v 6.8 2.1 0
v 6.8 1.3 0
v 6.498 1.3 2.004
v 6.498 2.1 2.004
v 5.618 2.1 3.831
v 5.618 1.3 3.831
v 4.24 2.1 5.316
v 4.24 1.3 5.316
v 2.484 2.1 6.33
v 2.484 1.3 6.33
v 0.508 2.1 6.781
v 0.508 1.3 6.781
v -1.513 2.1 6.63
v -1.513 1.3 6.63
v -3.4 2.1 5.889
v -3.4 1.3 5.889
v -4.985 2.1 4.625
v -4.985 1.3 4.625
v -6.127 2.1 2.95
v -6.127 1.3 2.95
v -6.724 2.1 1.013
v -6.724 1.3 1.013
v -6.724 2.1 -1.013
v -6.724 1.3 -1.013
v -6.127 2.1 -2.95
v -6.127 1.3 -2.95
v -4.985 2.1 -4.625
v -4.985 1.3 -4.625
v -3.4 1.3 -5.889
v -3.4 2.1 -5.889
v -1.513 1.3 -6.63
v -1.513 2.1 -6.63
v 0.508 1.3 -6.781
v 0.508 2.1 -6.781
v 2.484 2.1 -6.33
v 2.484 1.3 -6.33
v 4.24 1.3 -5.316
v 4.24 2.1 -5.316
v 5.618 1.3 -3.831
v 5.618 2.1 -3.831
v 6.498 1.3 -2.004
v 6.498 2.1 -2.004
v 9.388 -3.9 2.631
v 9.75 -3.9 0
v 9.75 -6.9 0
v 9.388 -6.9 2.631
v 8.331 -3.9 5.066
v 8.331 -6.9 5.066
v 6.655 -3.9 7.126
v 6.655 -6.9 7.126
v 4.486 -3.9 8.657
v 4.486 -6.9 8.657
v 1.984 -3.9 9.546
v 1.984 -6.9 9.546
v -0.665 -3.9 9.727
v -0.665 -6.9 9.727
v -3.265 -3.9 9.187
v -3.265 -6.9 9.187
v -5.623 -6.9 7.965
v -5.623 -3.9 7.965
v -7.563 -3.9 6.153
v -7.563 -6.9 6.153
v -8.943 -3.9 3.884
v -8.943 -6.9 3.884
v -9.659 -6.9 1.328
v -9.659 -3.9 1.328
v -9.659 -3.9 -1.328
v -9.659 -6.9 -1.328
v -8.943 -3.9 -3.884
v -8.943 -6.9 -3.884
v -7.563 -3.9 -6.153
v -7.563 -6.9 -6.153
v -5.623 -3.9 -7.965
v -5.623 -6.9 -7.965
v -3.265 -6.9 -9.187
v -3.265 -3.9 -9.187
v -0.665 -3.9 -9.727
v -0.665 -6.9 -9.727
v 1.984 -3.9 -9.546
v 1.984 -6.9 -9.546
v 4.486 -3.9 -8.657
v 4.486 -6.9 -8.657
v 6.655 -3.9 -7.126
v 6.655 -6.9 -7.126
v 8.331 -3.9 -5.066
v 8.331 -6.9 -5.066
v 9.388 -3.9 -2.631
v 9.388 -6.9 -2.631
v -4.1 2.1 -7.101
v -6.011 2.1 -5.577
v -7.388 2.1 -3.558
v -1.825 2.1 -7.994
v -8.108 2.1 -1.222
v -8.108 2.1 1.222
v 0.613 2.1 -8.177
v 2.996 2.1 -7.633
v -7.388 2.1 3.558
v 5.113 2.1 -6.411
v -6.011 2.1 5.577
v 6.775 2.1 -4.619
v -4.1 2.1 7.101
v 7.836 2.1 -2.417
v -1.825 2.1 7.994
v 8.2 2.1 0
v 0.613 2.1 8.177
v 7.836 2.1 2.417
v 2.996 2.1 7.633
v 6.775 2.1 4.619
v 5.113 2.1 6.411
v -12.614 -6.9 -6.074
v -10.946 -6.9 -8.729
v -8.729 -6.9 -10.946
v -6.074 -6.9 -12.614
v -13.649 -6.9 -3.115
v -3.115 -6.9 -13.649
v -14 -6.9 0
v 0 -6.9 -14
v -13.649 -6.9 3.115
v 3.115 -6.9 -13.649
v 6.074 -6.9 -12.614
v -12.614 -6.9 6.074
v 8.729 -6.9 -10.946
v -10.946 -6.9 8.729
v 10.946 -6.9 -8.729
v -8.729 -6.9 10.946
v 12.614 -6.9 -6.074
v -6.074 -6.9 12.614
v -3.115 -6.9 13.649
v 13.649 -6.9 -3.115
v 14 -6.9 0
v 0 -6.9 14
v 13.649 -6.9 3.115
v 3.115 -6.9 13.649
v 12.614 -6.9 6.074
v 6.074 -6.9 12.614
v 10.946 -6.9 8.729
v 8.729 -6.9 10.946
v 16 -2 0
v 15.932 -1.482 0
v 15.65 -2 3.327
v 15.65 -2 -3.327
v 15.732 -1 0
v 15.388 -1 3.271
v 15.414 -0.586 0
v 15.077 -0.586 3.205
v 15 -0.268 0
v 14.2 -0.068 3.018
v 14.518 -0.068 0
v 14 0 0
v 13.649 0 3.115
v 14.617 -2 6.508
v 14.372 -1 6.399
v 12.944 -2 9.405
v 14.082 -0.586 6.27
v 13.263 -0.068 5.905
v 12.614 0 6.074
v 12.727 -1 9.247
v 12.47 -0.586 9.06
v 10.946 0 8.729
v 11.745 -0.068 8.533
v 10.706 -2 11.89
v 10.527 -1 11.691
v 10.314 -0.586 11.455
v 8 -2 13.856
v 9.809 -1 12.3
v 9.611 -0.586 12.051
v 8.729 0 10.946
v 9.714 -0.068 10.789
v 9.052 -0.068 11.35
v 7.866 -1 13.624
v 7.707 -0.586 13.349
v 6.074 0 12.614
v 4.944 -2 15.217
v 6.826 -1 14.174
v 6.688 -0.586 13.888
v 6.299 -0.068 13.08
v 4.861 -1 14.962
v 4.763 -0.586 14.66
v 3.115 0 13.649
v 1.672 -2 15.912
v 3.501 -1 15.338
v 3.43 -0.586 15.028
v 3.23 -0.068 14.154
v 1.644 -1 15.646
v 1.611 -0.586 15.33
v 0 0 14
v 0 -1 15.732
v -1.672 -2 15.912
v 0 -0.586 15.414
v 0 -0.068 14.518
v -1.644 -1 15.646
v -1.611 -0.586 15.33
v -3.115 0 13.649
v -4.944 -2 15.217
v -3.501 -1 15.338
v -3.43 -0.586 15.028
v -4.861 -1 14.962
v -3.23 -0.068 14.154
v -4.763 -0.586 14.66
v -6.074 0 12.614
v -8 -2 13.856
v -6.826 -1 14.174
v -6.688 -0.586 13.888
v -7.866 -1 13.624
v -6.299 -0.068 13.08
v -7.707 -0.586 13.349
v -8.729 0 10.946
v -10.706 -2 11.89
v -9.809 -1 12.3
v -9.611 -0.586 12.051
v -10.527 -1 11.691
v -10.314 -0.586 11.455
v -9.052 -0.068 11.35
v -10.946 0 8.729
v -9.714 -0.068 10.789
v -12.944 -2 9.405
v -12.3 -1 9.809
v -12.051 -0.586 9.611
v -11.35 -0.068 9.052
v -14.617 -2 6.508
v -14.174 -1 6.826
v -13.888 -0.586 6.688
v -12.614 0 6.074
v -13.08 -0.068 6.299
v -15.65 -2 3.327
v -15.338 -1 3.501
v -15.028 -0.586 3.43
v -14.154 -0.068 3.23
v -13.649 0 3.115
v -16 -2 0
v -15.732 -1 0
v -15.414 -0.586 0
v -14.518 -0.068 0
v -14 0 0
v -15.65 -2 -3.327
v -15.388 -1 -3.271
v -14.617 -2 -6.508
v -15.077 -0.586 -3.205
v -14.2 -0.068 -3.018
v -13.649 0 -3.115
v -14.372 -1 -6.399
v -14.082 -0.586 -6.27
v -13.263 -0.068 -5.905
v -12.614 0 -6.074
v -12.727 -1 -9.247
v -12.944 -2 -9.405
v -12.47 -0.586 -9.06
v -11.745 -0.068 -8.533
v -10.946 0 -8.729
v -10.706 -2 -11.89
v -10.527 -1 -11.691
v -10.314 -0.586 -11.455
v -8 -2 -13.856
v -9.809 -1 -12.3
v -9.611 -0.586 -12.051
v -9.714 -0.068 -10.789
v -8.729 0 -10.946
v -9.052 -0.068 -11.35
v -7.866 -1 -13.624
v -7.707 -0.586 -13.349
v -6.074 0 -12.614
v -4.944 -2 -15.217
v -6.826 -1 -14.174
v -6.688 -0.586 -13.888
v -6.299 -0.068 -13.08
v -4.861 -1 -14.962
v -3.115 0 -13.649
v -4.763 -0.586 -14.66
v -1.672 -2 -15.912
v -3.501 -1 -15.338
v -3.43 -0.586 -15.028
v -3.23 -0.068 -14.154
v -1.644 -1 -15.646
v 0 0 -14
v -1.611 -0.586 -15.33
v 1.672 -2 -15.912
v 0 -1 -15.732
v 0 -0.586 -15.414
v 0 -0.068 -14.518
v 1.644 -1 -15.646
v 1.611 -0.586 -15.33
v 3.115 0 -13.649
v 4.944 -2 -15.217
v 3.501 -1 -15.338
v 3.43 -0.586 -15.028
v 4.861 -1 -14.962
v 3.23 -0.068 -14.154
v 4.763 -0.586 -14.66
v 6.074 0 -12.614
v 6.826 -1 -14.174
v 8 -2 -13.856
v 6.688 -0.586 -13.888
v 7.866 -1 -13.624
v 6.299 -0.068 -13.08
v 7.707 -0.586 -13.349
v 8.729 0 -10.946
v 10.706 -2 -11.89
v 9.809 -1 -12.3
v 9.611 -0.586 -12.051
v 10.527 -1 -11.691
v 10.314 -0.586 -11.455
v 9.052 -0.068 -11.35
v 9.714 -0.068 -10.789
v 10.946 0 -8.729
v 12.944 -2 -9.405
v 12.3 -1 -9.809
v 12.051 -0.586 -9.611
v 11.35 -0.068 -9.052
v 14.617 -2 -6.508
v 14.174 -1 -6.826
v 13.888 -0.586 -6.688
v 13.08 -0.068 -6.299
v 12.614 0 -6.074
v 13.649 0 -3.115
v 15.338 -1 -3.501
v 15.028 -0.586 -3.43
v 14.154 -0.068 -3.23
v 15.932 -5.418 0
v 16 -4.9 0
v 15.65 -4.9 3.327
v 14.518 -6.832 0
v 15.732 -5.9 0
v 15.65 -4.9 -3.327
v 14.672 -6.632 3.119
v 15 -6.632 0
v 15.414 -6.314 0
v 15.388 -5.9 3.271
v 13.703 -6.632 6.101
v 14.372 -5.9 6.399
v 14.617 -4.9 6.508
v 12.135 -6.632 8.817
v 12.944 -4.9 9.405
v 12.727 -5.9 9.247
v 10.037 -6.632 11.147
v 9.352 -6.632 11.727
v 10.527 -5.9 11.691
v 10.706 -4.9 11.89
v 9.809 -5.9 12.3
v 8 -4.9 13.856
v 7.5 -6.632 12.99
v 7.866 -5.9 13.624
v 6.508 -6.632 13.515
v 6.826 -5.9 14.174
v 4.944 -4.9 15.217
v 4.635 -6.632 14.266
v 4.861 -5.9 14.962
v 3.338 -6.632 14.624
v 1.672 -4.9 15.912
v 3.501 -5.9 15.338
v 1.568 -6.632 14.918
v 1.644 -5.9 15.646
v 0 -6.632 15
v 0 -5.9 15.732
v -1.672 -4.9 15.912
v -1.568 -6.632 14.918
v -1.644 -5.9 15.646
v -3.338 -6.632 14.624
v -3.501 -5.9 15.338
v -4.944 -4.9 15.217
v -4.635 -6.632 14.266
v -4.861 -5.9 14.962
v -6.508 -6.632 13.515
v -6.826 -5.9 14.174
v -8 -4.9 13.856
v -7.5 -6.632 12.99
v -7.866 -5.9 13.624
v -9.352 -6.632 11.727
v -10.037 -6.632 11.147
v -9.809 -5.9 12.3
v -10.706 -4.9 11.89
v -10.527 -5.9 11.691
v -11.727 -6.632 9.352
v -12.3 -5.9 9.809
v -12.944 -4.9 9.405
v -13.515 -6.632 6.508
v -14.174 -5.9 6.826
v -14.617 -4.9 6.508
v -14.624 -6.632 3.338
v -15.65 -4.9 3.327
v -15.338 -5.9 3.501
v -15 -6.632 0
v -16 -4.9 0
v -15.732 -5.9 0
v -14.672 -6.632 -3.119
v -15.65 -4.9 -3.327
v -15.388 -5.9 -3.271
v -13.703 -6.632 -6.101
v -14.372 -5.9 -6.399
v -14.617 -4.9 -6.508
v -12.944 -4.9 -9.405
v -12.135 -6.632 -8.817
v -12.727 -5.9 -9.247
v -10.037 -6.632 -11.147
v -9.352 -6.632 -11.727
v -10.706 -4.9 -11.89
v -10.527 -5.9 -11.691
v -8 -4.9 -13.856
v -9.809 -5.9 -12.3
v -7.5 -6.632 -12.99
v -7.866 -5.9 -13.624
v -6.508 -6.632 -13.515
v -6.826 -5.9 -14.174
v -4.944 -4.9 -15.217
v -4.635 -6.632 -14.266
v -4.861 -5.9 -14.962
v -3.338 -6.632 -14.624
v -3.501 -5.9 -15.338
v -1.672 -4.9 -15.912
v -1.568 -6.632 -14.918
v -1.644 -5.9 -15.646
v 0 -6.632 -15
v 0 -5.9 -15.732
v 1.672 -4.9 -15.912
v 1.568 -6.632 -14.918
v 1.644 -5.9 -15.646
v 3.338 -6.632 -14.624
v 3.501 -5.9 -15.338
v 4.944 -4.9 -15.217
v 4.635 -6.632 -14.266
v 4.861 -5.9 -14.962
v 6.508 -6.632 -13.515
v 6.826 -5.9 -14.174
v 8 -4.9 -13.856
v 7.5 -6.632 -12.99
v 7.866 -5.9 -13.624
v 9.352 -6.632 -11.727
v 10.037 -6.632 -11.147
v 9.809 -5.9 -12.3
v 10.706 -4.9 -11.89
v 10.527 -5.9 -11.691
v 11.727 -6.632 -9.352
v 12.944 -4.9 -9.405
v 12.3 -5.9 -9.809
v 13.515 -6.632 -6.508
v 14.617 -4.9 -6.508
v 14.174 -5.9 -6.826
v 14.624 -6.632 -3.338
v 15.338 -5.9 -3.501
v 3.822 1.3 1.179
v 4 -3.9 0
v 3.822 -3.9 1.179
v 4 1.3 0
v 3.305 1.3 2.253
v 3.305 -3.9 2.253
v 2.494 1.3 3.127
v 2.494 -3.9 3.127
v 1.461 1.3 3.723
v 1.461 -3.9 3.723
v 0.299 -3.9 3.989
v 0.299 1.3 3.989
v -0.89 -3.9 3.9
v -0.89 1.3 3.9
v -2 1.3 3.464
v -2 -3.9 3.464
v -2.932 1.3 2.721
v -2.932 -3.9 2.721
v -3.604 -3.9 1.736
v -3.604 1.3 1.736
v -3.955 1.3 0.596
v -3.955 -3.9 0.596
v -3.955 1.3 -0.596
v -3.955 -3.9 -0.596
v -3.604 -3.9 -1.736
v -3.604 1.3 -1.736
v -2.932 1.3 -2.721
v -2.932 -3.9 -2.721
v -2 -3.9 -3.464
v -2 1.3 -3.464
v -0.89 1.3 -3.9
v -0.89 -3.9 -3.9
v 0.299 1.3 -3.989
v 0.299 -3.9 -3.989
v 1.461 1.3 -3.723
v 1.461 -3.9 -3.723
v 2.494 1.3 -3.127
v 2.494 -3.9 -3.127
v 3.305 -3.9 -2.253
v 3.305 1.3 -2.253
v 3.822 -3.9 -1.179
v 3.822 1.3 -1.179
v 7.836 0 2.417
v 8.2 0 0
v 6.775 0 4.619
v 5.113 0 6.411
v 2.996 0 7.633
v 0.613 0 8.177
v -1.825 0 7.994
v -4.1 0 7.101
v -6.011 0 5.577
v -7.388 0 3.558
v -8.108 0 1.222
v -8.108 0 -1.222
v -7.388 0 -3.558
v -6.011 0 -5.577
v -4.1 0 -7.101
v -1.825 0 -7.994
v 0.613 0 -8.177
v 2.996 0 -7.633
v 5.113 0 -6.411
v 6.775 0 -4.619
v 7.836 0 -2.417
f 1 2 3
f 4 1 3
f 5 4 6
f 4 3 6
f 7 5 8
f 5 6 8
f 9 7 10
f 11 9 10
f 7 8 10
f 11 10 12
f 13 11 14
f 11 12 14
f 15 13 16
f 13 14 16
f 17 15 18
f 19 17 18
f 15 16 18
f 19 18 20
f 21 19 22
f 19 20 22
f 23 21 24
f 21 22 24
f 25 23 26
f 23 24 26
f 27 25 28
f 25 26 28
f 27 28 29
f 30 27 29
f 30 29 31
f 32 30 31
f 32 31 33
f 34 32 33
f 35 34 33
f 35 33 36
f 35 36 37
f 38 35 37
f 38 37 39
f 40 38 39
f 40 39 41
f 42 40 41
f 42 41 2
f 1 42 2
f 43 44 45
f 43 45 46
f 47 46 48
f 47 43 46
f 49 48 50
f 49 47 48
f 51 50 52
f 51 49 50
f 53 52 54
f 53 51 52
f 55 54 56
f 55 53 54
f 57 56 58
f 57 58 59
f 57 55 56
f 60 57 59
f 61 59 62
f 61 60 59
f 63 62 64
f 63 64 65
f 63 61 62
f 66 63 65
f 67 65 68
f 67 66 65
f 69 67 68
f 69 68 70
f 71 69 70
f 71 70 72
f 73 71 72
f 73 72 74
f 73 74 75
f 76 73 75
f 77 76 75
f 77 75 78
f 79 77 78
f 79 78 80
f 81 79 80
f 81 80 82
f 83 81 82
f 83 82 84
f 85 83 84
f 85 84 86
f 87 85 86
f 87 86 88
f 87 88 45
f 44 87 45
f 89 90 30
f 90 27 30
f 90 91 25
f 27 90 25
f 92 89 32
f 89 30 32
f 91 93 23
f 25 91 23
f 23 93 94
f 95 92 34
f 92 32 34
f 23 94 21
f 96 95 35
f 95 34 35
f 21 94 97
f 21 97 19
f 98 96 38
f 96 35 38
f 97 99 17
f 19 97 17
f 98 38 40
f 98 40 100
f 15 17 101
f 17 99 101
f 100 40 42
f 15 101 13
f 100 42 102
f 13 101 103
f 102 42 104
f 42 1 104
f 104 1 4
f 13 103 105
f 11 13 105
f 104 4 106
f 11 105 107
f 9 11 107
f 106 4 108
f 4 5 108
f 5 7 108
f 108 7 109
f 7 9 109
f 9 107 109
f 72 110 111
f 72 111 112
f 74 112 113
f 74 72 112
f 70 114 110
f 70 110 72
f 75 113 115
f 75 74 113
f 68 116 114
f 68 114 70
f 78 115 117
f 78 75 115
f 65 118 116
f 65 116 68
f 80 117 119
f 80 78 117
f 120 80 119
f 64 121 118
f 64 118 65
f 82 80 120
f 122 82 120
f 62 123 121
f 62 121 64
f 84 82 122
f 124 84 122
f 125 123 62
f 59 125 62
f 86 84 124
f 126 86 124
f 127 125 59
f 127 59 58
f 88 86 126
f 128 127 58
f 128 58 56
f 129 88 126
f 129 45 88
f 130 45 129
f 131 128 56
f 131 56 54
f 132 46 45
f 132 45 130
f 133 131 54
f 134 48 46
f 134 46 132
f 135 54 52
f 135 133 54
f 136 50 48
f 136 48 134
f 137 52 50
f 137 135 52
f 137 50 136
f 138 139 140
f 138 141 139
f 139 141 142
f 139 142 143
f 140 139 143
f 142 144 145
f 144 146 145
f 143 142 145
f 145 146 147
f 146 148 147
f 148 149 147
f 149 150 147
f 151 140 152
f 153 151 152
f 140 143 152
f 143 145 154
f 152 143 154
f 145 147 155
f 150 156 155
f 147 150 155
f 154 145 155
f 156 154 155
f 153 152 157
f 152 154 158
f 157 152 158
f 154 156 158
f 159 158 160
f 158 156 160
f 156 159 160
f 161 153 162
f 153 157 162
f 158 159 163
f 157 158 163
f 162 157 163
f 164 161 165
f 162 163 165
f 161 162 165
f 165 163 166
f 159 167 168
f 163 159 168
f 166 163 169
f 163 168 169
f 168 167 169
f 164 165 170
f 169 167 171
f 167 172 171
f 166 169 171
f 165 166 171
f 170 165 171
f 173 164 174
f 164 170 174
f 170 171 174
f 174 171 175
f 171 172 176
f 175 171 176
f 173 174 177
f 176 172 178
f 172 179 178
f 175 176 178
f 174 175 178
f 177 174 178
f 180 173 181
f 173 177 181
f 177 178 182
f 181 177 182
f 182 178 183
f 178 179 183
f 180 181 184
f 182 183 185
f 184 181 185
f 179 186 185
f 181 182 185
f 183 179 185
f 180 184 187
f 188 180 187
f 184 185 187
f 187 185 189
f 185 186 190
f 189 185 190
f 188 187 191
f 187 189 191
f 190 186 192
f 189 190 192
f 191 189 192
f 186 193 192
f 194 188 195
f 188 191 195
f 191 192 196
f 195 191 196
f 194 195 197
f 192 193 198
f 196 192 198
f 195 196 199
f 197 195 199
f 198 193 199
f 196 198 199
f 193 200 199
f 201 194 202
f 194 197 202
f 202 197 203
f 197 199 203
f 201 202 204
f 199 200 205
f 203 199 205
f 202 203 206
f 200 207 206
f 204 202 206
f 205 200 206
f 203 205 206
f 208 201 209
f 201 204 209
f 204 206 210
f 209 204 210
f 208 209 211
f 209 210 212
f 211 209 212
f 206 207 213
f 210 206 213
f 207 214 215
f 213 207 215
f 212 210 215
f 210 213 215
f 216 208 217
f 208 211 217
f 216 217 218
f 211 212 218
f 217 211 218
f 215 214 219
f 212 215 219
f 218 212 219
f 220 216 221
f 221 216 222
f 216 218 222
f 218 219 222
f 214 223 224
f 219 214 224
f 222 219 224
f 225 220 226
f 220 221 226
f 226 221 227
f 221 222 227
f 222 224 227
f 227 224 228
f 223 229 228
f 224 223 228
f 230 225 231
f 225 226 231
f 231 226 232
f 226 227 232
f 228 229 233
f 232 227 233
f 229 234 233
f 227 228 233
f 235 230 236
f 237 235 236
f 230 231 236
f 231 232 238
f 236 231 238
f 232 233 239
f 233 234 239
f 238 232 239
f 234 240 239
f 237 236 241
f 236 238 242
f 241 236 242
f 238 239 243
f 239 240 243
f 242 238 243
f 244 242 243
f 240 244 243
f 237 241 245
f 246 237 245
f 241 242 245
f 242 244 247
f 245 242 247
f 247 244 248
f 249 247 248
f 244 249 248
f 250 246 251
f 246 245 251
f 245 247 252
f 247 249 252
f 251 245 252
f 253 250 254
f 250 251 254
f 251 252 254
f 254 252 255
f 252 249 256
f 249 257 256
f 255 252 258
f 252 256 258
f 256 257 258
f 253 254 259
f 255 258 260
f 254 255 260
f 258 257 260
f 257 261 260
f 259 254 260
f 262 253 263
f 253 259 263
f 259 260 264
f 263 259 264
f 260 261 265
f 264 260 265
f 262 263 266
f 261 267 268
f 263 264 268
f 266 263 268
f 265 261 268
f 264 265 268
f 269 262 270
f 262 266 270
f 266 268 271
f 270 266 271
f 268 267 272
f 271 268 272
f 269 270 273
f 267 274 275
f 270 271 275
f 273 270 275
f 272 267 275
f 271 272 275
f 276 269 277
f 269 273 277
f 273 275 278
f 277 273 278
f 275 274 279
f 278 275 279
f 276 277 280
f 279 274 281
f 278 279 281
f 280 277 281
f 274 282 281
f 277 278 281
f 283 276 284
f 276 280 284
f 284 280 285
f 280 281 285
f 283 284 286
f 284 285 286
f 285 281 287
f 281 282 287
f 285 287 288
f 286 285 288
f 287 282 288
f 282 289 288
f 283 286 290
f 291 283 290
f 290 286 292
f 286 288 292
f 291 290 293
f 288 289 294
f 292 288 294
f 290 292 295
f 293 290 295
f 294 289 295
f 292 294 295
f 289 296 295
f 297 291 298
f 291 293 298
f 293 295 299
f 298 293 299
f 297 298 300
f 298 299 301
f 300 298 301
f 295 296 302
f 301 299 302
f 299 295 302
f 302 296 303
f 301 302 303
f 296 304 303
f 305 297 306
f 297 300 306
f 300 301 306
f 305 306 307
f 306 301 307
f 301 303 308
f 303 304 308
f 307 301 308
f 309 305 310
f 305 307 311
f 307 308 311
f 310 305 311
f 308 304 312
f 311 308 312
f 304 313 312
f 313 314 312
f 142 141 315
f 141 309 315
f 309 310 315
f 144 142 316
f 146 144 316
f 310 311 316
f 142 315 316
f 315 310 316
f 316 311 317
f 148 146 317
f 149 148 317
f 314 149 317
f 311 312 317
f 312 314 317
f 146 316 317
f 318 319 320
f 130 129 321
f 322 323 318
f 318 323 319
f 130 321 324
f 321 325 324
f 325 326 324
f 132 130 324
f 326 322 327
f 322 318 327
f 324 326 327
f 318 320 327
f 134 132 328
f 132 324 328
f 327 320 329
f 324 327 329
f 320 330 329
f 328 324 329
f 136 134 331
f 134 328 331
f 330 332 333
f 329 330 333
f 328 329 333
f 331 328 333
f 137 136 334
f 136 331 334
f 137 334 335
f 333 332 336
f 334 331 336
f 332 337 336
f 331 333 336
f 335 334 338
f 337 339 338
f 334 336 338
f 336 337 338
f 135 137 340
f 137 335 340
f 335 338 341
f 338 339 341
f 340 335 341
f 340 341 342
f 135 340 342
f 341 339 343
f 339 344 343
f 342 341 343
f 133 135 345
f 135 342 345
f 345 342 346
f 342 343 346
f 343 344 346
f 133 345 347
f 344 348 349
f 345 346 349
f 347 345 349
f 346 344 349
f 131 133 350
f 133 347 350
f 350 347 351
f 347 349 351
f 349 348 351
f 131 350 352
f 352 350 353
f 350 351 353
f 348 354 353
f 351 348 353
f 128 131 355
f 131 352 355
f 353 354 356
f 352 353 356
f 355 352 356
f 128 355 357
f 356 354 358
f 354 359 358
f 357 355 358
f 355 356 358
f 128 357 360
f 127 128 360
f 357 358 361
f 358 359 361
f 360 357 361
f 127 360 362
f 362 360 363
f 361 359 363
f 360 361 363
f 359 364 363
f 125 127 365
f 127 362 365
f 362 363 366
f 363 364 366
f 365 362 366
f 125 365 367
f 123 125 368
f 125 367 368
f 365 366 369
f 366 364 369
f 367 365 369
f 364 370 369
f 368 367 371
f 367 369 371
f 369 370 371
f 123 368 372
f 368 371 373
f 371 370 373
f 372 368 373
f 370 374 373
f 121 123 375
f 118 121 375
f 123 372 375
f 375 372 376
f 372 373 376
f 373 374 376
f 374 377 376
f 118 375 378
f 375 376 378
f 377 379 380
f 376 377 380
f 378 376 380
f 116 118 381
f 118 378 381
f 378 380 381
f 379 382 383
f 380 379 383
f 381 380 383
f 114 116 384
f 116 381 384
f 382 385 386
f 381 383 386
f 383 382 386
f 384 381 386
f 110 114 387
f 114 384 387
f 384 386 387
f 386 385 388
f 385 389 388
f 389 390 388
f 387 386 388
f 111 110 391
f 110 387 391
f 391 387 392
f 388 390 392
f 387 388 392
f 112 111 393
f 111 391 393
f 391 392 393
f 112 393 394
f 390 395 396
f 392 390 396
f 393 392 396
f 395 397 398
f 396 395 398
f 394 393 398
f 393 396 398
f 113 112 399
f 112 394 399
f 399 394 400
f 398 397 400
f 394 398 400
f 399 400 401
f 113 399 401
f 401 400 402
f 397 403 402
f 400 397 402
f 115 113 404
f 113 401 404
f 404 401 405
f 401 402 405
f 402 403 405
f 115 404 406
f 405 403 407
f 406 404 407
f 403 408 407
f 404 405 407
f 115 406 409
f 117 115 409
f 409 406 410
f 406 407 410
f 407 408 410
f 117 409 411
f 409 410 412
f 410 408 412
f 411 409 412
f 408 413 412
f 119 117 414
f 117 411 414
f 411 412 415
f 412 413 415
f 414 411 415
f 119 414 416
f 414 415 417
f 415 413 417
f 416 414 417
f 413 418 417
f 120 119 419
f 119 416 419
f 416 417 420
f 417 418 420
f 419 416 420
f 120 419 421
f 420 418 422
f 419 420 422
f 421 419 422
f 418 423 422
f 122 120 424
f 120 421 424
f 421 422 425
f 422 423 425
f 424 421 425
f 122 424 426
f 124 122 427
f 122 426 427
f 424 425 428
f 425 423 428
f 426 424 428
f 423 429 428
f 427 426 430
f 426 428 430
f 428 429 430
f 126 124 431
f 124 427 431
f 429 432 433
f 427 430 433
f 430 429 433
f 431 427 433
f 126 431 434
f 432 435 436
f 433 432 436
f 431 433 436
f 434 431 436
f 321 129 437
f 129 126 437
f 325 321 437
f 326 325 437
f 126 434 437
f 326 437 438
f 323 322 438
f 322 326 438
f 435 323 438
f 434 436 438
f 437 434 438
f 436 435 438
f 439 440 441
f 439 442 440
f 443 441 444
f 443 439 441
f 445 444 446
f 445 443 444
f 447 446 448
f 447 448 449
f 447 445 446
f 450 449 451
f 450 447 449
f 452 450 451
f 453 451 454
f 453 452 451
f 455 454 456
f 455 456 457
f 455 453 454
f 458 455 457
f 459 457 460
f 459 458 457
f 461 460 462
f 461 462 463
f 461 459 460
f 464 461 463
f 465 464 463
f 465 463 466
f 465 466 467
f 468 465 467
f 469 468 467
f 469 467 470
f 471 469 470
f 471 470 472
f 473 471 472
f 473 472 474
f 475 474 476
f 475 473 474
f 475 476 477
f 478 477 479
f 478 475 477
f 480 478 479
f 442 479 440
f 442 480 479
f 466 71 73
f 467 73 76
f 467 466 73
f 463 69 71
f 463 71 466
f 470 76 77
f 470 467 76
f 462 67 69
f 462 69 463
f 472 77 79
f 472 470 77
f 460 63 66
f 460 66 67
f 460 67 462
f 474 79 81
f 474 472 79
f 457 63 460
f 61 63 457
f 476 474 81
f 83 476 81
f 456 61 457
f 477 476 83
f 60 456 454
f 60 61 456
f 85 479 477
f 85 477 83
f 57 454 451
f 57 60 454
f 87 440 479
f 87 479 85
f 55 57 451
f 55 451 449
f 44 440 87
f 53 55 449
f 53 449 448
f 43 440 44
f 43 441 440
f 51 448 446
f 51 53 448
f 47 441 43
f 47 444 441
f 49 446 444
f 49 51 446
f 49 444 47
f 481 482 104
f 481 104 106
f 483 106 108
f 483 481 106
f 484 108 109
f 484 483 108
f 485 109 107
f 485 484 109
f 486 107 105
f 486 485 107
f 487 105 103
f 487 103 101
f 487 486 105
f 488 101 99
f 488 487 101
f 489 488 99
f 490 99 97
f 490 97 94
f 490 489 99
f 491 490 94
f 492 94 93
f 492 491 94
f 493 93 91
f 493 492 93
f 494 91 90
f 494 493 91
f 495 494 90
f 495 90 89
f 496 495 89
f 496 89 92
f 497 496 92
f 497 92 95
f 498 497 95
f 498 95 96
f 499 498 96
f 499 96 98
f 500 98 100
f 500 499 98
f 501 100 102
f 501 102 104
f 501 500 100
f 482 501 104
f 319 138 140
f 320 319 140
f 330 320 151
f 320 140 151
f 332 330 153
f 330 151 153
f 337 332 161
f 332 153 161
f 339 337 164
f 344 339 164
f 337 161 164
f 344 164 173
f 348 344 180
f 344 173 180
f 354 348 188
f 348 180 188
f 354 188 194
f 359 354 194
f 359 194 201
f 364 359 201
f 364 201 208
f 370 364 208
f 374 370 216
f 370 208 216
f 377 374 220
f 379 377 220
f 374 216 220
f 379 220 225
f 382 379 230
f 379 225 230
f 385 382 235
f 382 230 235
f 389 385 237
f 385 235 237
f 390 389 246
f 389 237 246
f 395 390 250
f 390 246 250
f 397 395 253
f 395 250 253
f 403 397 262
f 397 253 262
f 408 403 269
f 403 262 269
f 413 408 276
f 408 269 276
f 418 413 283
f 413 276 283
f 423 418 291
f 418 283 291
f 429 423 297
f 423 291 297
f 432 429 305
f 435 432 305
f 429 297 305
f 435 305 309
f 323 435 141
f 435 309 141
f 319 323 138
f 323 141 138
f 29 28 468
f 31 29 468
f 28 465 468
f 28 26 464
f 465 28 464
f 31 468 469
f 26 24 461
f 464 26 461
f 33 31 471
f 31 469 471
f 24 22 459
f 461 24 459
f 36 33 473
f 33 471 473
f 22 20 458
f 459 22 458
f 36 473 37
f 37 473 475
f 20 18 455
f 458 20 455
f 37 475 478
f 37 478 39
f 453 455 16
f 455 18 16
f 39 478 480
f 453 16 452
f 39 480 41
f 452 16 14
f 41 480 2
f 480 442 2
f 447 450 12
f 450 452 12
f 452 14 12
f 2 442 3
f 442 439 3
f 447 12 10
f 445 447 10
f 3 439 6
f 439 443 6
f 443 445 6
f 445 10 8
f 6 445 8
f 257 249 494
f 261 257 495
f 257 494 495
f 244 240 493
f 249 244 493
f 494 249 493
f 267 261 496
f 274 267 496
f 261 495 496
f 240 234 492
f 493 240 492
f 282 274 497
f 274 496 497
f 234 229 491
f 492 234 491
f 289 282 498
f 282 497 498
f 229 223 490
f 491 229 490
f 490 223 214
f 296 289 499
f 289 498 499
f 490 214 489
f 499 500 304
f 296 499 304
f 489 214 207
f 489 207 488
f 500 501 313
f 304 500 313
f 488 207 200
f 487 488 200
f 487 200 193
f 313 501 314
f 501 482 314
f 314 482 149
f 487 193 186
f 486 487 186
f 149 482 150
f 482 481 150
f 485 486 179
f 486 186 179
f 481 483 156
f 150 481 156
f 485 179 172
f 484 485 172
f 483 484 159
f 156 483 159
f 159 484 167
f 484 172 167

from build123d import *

# Parameters (mm, degrees)
F0_R     = 9.75
F0_R_2   = 4
F1_DEPTH = 3.9
F0_R_3   = 16
F2_DEPTH = 6.9
F3_R     = 8.2
F3_R_2   = 6.8
F4_DEPTH = 2.1
F3_R_3   = 4
F5_DEPTH = 1.3
F6_R     = 2


with BuildPart() as f1:
    # F0 (on Front) → F1 (new body)
    with BuildSketch(Plane.XZ):
        Circle(F0_R)
        Circle(F0_R_2, mode=Mode.SUBTRACT)
    extrude(amount=F1_DEPTH)

    # F0 (on Front) → F2 (join)
    with BuildSketch(Plane.XZ):
        Circle(F0_R_3)
        Circle(F0_R, mode=Mode.SUBTRACT)
    extrude(amount=F2_DEPTH)

    # F3 (on Front) → F4 (join)
    with BuildSketch(Plane.XZ):
        Circle(F3_R)
        Circle(F3_R_2, mode=Mode.SUBTRACT)
    extrude(amount=-F4_DEPTH)

    # F3 (on Front) → F5 (join)
    with BuildSketch(Plane.XZ):
        Circle(F3_R_2)
        Circle(F3_R_3, mode=Mode.SUBTRACT)
    extrude(amount=-F5_DEPTH)

    # F6
    f6_edges = [f1.edges().sort_by_distance(p)[0] for p in [
        (-16, -6.9, 0),
        (-16, 0, 0),
    ]]
    fillet(f6_edges, radius=F6_R)


solid = f1.part
